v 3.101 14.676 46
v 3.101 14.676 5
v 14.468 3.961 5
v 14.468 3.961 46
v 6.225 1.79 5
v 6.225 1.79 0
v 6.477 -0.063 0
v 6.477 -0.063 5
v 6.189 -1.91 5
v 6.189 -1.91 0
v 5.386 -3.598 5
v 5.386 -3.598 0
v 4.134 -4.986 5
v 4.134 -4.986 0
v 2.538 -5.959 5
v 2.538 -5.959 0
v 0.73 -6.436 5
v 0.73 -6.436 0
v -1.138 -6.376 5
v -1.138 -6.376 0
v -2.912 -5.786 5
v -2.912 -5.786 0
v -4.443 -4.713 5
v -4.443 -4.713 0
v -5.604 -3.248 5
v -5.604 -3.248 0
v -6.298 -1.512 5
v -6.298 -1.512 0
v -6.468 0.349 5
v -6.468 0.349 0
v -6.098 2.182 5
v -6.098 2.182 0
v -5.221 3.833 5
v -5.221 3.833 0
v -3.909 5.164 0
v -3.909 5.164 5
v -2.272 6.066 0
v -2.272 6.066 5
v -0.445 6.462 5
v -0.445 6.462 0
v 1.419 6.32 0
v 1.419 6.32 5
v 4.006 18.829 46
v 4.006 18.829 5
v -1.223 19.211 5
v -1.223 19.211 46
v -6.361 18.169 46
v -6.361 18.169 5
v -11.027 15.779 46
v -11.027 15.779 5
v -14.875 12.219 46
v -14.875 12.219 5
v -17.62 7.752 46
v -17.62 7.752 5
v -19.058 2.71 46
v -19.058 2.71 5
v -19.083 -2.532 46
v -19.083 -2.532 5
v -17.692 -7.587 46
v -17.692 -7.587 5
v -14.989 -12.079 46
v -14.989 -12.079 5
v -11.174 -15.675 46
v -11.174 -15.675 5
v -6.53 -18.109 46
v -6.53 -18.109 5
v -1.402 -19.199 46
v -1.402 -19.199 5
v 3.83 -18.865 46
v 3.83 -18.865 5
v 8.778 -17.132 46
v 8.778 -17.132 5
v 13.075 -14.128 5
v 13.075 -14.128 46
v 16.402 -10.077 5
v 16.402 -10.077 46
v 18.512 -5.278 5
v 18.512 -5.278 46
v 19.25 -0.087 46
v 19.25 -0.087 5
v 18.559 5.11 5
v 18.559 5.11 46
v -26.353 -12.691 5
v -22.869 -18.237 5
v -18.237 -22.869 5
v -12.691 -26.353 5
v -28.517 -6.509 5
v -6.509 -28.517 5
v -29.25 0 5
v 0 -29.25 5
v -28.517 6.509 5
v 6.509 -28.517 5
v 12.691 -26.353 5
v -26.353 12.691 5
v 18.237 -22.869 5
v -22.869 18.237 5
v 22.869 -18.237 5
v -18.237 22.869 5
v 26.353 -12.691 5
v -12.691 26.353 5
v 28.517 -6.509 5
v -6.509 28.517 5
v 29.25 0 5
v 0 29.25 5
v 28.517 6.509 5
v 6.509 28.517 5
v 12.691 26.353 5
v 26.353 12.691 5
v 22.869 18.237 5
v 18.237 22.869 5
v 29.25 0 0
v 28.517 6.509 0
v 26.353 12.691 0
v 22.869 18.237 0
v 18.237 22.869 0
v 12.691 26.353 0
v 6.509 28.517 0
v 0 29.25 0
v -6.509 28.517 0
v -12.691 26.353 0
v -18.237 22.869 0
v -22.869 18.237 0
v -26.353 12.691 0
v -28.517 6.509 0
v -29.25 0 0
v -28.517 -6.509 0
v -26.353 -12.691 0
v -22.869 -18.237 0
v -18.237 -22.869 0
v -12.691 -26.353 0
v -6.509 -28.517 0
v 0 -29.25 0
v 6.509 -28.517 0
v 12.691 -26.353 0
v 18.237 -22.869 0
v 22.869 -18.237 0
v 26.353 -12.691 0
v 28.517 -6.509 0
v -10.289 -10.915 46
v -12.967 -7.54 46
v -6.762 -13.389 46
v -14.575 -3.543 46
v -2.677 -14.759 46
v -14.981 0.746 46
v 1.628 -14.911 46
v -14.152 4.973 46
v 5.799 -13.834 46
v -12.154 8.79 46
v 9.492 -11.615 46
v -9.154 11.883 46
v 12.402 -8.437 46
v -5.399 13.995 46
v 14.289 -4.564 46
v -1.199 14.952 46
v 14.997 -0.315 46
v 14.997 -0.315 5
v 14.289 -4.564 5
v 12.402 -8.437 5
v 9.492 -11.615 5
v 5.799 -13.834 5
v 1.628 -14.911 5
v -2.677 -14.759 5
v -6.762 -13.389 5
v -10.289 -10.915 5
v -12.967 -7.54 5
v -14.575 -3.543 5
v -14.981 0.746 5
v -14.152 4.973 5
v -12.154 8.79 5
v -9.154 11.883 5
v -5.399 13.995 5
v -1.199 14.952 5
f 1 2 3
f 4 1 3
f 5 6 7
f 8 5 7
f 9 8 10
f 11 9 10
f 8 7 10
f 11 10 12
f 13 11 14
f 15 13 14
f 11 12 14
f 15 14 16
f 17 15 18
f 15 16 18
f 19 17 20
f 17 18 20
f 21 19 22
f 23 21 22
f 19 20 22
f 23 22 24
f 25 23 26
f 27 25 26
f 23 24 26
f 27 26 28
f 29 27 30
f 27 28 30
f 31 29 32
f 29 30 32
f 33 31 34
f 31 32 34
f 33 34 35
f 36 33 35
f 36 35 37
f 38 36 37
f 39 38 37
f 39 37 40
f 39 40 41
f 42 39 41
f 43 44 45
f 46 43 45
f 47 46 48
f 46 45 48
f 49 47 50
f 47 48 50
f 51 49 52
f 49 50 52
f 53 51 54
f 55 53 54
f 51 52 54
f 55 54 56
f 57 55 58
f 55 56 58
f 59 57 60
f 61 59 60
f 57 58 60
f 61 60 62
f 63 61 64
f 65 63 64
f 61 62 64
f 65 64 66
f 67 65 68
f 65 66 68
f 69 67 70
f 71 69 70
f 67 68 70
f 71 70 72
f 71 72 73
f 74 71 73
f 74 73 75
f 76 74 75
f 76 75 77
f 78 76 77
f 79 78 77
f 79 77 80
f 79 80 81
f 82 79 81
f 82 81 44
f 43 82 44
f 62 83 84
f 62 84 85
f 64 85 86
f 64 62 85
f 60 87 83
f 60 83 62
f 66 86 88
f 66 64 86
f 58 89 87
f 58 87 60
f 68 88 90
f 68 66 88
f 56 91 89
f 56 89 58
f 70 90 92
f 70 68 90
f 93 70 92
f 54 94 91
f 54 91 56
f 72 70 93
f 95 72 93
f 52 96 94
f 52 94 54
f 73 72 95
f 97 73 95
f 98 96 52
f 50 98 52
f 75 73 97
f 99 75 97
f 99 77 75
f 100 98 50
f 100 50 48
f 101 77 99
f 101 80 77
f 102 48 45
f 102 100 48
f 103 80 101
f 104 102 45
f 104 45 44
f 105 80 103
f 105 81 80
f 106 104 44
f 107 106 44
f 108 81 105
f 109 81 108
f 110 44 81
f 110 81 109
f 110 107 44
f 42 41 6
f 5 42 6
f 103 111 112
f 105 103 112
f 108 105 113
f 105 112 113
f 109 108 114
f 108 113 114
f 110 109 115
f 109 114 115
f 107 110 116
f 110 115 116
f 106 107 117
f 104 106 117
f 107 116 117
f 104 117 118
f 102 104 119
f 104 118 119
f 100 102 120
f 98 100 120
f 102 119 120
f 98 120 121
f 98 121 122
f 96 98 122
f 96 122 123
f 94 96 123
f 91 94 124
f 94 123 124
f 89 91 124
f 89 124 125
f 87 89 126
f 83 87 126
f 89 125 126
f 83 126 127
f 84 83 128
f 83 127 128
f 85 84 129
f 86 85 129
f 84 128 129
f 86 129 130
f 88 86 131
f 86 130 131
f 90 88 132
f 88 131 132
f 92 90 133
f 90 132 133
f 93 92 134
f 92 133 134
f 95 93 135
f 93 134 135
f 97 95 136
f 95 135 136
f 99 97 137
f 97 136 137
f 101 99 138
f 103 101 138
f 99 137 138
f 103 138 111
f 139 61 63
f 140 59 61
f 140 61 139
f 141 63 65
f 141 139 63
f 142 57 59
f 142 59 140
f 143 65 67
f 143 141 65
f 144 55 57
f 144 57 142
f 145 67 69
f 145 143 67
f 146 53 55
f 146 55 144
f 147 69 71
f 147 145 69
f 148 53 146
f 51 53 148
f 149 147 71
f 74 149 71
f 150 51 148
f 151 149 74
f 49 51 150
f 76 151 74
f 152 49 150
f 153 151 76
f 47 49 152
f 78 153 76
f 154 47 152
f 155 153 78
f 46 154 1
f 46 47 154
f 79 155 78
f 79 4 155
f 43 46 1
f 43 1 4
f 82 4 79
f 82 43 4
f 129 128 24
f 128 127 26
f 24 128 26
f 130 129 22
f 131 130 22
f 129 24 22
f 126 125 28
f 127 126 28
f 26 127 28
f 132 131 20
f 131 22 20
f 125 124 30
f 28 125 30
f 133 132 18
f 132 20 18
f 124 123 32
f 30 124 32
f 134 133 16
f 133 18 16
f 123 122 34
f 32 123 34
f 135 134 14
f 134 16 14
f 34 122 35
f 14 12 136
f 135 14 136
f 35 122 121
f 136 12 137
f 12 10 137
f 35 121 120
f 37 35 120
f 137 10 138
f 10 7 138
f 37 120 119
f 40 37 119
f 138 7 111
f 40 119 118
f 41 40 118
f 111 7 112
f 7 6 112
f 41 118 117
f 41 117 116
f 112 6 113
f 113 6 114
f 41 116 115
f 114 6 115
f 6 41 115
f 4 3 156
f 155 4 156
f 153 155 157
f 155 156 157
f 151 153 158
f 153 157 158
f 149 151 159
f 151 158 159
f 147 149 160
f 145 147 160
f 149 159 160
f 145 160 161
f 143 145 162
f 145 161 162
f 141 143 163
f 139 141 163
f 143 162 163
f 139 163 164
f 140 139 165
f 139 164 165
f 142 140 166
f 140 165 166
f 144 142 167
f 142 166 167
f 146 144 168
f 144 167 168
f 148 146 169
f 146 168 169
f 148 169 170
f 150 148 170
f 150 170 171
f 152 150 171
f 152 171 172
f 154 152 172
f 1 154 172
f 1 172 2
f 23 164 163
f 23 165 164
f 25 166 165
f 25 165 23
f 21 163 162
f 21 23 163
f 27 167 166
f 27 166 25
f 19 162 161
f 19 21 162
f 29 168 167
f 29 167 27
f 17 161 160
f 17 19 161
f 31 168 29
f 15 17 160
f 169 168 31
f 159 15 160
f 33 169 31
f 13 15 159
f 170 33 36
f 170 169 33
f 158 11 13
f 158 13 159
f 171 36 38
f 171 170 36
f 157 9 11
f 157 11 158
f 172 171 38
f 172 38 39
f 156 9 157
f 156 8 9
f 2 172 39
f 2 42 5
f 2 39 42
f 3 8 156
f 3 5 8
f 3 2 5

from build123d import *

# Parameters (mm, degrees)
F0_R     = 29.25
F1_DEPTH = 5
F3_DEPTH = 41
F6_DEPTH = 25.4


with BuildPart() as f1:
    # F0 (on Top) → F1 (new body)
    with BuildSketch(Plane.XY):
        Circle(F0_R)
    extrude(amount=F1_DEPTH)

    # F2 (on face) → F3 (join)
    with BuildSketch(Plane.XY.offset(5)):
        with BuildLine():
            Line((18.559394, 5.10993), (4.006055, 18.828543))
            ThreePointArc((4.006055, 18.828543), (-13.204164, -14.007589), (18.559394, 5.10993))
        make_face()
        with BuildLine():
            ThreePointArc((14.467536, 3.961112), (-10.288959, -10.915004), (3.10065, 14.676034))
            Line((3.10065, 14.676034), (14.467536, 3.961112))
        make_face(mode=Mode.SUBTRACT)
    extrude(amount=F3_DEPTH)

    # F5 (on face) → F6 (cut)
    with BuildSketch(Plane(origin=(0, 0, 0), x_dir=(1, 0, 0), z_dir=(0, 0, -1))):
        with BuildLine():
            Line((1.419319, -6.319578), (6.224832, -1.789692))
            ThreePointArc((6.224832, -1.789692), (-4.442773, 4.713099), (1.419319, -6.319578))
        make_face()
    extrude(amount=-F6_DEPTH, mode=Mode.SUBTRACT)


solid = f1.part
